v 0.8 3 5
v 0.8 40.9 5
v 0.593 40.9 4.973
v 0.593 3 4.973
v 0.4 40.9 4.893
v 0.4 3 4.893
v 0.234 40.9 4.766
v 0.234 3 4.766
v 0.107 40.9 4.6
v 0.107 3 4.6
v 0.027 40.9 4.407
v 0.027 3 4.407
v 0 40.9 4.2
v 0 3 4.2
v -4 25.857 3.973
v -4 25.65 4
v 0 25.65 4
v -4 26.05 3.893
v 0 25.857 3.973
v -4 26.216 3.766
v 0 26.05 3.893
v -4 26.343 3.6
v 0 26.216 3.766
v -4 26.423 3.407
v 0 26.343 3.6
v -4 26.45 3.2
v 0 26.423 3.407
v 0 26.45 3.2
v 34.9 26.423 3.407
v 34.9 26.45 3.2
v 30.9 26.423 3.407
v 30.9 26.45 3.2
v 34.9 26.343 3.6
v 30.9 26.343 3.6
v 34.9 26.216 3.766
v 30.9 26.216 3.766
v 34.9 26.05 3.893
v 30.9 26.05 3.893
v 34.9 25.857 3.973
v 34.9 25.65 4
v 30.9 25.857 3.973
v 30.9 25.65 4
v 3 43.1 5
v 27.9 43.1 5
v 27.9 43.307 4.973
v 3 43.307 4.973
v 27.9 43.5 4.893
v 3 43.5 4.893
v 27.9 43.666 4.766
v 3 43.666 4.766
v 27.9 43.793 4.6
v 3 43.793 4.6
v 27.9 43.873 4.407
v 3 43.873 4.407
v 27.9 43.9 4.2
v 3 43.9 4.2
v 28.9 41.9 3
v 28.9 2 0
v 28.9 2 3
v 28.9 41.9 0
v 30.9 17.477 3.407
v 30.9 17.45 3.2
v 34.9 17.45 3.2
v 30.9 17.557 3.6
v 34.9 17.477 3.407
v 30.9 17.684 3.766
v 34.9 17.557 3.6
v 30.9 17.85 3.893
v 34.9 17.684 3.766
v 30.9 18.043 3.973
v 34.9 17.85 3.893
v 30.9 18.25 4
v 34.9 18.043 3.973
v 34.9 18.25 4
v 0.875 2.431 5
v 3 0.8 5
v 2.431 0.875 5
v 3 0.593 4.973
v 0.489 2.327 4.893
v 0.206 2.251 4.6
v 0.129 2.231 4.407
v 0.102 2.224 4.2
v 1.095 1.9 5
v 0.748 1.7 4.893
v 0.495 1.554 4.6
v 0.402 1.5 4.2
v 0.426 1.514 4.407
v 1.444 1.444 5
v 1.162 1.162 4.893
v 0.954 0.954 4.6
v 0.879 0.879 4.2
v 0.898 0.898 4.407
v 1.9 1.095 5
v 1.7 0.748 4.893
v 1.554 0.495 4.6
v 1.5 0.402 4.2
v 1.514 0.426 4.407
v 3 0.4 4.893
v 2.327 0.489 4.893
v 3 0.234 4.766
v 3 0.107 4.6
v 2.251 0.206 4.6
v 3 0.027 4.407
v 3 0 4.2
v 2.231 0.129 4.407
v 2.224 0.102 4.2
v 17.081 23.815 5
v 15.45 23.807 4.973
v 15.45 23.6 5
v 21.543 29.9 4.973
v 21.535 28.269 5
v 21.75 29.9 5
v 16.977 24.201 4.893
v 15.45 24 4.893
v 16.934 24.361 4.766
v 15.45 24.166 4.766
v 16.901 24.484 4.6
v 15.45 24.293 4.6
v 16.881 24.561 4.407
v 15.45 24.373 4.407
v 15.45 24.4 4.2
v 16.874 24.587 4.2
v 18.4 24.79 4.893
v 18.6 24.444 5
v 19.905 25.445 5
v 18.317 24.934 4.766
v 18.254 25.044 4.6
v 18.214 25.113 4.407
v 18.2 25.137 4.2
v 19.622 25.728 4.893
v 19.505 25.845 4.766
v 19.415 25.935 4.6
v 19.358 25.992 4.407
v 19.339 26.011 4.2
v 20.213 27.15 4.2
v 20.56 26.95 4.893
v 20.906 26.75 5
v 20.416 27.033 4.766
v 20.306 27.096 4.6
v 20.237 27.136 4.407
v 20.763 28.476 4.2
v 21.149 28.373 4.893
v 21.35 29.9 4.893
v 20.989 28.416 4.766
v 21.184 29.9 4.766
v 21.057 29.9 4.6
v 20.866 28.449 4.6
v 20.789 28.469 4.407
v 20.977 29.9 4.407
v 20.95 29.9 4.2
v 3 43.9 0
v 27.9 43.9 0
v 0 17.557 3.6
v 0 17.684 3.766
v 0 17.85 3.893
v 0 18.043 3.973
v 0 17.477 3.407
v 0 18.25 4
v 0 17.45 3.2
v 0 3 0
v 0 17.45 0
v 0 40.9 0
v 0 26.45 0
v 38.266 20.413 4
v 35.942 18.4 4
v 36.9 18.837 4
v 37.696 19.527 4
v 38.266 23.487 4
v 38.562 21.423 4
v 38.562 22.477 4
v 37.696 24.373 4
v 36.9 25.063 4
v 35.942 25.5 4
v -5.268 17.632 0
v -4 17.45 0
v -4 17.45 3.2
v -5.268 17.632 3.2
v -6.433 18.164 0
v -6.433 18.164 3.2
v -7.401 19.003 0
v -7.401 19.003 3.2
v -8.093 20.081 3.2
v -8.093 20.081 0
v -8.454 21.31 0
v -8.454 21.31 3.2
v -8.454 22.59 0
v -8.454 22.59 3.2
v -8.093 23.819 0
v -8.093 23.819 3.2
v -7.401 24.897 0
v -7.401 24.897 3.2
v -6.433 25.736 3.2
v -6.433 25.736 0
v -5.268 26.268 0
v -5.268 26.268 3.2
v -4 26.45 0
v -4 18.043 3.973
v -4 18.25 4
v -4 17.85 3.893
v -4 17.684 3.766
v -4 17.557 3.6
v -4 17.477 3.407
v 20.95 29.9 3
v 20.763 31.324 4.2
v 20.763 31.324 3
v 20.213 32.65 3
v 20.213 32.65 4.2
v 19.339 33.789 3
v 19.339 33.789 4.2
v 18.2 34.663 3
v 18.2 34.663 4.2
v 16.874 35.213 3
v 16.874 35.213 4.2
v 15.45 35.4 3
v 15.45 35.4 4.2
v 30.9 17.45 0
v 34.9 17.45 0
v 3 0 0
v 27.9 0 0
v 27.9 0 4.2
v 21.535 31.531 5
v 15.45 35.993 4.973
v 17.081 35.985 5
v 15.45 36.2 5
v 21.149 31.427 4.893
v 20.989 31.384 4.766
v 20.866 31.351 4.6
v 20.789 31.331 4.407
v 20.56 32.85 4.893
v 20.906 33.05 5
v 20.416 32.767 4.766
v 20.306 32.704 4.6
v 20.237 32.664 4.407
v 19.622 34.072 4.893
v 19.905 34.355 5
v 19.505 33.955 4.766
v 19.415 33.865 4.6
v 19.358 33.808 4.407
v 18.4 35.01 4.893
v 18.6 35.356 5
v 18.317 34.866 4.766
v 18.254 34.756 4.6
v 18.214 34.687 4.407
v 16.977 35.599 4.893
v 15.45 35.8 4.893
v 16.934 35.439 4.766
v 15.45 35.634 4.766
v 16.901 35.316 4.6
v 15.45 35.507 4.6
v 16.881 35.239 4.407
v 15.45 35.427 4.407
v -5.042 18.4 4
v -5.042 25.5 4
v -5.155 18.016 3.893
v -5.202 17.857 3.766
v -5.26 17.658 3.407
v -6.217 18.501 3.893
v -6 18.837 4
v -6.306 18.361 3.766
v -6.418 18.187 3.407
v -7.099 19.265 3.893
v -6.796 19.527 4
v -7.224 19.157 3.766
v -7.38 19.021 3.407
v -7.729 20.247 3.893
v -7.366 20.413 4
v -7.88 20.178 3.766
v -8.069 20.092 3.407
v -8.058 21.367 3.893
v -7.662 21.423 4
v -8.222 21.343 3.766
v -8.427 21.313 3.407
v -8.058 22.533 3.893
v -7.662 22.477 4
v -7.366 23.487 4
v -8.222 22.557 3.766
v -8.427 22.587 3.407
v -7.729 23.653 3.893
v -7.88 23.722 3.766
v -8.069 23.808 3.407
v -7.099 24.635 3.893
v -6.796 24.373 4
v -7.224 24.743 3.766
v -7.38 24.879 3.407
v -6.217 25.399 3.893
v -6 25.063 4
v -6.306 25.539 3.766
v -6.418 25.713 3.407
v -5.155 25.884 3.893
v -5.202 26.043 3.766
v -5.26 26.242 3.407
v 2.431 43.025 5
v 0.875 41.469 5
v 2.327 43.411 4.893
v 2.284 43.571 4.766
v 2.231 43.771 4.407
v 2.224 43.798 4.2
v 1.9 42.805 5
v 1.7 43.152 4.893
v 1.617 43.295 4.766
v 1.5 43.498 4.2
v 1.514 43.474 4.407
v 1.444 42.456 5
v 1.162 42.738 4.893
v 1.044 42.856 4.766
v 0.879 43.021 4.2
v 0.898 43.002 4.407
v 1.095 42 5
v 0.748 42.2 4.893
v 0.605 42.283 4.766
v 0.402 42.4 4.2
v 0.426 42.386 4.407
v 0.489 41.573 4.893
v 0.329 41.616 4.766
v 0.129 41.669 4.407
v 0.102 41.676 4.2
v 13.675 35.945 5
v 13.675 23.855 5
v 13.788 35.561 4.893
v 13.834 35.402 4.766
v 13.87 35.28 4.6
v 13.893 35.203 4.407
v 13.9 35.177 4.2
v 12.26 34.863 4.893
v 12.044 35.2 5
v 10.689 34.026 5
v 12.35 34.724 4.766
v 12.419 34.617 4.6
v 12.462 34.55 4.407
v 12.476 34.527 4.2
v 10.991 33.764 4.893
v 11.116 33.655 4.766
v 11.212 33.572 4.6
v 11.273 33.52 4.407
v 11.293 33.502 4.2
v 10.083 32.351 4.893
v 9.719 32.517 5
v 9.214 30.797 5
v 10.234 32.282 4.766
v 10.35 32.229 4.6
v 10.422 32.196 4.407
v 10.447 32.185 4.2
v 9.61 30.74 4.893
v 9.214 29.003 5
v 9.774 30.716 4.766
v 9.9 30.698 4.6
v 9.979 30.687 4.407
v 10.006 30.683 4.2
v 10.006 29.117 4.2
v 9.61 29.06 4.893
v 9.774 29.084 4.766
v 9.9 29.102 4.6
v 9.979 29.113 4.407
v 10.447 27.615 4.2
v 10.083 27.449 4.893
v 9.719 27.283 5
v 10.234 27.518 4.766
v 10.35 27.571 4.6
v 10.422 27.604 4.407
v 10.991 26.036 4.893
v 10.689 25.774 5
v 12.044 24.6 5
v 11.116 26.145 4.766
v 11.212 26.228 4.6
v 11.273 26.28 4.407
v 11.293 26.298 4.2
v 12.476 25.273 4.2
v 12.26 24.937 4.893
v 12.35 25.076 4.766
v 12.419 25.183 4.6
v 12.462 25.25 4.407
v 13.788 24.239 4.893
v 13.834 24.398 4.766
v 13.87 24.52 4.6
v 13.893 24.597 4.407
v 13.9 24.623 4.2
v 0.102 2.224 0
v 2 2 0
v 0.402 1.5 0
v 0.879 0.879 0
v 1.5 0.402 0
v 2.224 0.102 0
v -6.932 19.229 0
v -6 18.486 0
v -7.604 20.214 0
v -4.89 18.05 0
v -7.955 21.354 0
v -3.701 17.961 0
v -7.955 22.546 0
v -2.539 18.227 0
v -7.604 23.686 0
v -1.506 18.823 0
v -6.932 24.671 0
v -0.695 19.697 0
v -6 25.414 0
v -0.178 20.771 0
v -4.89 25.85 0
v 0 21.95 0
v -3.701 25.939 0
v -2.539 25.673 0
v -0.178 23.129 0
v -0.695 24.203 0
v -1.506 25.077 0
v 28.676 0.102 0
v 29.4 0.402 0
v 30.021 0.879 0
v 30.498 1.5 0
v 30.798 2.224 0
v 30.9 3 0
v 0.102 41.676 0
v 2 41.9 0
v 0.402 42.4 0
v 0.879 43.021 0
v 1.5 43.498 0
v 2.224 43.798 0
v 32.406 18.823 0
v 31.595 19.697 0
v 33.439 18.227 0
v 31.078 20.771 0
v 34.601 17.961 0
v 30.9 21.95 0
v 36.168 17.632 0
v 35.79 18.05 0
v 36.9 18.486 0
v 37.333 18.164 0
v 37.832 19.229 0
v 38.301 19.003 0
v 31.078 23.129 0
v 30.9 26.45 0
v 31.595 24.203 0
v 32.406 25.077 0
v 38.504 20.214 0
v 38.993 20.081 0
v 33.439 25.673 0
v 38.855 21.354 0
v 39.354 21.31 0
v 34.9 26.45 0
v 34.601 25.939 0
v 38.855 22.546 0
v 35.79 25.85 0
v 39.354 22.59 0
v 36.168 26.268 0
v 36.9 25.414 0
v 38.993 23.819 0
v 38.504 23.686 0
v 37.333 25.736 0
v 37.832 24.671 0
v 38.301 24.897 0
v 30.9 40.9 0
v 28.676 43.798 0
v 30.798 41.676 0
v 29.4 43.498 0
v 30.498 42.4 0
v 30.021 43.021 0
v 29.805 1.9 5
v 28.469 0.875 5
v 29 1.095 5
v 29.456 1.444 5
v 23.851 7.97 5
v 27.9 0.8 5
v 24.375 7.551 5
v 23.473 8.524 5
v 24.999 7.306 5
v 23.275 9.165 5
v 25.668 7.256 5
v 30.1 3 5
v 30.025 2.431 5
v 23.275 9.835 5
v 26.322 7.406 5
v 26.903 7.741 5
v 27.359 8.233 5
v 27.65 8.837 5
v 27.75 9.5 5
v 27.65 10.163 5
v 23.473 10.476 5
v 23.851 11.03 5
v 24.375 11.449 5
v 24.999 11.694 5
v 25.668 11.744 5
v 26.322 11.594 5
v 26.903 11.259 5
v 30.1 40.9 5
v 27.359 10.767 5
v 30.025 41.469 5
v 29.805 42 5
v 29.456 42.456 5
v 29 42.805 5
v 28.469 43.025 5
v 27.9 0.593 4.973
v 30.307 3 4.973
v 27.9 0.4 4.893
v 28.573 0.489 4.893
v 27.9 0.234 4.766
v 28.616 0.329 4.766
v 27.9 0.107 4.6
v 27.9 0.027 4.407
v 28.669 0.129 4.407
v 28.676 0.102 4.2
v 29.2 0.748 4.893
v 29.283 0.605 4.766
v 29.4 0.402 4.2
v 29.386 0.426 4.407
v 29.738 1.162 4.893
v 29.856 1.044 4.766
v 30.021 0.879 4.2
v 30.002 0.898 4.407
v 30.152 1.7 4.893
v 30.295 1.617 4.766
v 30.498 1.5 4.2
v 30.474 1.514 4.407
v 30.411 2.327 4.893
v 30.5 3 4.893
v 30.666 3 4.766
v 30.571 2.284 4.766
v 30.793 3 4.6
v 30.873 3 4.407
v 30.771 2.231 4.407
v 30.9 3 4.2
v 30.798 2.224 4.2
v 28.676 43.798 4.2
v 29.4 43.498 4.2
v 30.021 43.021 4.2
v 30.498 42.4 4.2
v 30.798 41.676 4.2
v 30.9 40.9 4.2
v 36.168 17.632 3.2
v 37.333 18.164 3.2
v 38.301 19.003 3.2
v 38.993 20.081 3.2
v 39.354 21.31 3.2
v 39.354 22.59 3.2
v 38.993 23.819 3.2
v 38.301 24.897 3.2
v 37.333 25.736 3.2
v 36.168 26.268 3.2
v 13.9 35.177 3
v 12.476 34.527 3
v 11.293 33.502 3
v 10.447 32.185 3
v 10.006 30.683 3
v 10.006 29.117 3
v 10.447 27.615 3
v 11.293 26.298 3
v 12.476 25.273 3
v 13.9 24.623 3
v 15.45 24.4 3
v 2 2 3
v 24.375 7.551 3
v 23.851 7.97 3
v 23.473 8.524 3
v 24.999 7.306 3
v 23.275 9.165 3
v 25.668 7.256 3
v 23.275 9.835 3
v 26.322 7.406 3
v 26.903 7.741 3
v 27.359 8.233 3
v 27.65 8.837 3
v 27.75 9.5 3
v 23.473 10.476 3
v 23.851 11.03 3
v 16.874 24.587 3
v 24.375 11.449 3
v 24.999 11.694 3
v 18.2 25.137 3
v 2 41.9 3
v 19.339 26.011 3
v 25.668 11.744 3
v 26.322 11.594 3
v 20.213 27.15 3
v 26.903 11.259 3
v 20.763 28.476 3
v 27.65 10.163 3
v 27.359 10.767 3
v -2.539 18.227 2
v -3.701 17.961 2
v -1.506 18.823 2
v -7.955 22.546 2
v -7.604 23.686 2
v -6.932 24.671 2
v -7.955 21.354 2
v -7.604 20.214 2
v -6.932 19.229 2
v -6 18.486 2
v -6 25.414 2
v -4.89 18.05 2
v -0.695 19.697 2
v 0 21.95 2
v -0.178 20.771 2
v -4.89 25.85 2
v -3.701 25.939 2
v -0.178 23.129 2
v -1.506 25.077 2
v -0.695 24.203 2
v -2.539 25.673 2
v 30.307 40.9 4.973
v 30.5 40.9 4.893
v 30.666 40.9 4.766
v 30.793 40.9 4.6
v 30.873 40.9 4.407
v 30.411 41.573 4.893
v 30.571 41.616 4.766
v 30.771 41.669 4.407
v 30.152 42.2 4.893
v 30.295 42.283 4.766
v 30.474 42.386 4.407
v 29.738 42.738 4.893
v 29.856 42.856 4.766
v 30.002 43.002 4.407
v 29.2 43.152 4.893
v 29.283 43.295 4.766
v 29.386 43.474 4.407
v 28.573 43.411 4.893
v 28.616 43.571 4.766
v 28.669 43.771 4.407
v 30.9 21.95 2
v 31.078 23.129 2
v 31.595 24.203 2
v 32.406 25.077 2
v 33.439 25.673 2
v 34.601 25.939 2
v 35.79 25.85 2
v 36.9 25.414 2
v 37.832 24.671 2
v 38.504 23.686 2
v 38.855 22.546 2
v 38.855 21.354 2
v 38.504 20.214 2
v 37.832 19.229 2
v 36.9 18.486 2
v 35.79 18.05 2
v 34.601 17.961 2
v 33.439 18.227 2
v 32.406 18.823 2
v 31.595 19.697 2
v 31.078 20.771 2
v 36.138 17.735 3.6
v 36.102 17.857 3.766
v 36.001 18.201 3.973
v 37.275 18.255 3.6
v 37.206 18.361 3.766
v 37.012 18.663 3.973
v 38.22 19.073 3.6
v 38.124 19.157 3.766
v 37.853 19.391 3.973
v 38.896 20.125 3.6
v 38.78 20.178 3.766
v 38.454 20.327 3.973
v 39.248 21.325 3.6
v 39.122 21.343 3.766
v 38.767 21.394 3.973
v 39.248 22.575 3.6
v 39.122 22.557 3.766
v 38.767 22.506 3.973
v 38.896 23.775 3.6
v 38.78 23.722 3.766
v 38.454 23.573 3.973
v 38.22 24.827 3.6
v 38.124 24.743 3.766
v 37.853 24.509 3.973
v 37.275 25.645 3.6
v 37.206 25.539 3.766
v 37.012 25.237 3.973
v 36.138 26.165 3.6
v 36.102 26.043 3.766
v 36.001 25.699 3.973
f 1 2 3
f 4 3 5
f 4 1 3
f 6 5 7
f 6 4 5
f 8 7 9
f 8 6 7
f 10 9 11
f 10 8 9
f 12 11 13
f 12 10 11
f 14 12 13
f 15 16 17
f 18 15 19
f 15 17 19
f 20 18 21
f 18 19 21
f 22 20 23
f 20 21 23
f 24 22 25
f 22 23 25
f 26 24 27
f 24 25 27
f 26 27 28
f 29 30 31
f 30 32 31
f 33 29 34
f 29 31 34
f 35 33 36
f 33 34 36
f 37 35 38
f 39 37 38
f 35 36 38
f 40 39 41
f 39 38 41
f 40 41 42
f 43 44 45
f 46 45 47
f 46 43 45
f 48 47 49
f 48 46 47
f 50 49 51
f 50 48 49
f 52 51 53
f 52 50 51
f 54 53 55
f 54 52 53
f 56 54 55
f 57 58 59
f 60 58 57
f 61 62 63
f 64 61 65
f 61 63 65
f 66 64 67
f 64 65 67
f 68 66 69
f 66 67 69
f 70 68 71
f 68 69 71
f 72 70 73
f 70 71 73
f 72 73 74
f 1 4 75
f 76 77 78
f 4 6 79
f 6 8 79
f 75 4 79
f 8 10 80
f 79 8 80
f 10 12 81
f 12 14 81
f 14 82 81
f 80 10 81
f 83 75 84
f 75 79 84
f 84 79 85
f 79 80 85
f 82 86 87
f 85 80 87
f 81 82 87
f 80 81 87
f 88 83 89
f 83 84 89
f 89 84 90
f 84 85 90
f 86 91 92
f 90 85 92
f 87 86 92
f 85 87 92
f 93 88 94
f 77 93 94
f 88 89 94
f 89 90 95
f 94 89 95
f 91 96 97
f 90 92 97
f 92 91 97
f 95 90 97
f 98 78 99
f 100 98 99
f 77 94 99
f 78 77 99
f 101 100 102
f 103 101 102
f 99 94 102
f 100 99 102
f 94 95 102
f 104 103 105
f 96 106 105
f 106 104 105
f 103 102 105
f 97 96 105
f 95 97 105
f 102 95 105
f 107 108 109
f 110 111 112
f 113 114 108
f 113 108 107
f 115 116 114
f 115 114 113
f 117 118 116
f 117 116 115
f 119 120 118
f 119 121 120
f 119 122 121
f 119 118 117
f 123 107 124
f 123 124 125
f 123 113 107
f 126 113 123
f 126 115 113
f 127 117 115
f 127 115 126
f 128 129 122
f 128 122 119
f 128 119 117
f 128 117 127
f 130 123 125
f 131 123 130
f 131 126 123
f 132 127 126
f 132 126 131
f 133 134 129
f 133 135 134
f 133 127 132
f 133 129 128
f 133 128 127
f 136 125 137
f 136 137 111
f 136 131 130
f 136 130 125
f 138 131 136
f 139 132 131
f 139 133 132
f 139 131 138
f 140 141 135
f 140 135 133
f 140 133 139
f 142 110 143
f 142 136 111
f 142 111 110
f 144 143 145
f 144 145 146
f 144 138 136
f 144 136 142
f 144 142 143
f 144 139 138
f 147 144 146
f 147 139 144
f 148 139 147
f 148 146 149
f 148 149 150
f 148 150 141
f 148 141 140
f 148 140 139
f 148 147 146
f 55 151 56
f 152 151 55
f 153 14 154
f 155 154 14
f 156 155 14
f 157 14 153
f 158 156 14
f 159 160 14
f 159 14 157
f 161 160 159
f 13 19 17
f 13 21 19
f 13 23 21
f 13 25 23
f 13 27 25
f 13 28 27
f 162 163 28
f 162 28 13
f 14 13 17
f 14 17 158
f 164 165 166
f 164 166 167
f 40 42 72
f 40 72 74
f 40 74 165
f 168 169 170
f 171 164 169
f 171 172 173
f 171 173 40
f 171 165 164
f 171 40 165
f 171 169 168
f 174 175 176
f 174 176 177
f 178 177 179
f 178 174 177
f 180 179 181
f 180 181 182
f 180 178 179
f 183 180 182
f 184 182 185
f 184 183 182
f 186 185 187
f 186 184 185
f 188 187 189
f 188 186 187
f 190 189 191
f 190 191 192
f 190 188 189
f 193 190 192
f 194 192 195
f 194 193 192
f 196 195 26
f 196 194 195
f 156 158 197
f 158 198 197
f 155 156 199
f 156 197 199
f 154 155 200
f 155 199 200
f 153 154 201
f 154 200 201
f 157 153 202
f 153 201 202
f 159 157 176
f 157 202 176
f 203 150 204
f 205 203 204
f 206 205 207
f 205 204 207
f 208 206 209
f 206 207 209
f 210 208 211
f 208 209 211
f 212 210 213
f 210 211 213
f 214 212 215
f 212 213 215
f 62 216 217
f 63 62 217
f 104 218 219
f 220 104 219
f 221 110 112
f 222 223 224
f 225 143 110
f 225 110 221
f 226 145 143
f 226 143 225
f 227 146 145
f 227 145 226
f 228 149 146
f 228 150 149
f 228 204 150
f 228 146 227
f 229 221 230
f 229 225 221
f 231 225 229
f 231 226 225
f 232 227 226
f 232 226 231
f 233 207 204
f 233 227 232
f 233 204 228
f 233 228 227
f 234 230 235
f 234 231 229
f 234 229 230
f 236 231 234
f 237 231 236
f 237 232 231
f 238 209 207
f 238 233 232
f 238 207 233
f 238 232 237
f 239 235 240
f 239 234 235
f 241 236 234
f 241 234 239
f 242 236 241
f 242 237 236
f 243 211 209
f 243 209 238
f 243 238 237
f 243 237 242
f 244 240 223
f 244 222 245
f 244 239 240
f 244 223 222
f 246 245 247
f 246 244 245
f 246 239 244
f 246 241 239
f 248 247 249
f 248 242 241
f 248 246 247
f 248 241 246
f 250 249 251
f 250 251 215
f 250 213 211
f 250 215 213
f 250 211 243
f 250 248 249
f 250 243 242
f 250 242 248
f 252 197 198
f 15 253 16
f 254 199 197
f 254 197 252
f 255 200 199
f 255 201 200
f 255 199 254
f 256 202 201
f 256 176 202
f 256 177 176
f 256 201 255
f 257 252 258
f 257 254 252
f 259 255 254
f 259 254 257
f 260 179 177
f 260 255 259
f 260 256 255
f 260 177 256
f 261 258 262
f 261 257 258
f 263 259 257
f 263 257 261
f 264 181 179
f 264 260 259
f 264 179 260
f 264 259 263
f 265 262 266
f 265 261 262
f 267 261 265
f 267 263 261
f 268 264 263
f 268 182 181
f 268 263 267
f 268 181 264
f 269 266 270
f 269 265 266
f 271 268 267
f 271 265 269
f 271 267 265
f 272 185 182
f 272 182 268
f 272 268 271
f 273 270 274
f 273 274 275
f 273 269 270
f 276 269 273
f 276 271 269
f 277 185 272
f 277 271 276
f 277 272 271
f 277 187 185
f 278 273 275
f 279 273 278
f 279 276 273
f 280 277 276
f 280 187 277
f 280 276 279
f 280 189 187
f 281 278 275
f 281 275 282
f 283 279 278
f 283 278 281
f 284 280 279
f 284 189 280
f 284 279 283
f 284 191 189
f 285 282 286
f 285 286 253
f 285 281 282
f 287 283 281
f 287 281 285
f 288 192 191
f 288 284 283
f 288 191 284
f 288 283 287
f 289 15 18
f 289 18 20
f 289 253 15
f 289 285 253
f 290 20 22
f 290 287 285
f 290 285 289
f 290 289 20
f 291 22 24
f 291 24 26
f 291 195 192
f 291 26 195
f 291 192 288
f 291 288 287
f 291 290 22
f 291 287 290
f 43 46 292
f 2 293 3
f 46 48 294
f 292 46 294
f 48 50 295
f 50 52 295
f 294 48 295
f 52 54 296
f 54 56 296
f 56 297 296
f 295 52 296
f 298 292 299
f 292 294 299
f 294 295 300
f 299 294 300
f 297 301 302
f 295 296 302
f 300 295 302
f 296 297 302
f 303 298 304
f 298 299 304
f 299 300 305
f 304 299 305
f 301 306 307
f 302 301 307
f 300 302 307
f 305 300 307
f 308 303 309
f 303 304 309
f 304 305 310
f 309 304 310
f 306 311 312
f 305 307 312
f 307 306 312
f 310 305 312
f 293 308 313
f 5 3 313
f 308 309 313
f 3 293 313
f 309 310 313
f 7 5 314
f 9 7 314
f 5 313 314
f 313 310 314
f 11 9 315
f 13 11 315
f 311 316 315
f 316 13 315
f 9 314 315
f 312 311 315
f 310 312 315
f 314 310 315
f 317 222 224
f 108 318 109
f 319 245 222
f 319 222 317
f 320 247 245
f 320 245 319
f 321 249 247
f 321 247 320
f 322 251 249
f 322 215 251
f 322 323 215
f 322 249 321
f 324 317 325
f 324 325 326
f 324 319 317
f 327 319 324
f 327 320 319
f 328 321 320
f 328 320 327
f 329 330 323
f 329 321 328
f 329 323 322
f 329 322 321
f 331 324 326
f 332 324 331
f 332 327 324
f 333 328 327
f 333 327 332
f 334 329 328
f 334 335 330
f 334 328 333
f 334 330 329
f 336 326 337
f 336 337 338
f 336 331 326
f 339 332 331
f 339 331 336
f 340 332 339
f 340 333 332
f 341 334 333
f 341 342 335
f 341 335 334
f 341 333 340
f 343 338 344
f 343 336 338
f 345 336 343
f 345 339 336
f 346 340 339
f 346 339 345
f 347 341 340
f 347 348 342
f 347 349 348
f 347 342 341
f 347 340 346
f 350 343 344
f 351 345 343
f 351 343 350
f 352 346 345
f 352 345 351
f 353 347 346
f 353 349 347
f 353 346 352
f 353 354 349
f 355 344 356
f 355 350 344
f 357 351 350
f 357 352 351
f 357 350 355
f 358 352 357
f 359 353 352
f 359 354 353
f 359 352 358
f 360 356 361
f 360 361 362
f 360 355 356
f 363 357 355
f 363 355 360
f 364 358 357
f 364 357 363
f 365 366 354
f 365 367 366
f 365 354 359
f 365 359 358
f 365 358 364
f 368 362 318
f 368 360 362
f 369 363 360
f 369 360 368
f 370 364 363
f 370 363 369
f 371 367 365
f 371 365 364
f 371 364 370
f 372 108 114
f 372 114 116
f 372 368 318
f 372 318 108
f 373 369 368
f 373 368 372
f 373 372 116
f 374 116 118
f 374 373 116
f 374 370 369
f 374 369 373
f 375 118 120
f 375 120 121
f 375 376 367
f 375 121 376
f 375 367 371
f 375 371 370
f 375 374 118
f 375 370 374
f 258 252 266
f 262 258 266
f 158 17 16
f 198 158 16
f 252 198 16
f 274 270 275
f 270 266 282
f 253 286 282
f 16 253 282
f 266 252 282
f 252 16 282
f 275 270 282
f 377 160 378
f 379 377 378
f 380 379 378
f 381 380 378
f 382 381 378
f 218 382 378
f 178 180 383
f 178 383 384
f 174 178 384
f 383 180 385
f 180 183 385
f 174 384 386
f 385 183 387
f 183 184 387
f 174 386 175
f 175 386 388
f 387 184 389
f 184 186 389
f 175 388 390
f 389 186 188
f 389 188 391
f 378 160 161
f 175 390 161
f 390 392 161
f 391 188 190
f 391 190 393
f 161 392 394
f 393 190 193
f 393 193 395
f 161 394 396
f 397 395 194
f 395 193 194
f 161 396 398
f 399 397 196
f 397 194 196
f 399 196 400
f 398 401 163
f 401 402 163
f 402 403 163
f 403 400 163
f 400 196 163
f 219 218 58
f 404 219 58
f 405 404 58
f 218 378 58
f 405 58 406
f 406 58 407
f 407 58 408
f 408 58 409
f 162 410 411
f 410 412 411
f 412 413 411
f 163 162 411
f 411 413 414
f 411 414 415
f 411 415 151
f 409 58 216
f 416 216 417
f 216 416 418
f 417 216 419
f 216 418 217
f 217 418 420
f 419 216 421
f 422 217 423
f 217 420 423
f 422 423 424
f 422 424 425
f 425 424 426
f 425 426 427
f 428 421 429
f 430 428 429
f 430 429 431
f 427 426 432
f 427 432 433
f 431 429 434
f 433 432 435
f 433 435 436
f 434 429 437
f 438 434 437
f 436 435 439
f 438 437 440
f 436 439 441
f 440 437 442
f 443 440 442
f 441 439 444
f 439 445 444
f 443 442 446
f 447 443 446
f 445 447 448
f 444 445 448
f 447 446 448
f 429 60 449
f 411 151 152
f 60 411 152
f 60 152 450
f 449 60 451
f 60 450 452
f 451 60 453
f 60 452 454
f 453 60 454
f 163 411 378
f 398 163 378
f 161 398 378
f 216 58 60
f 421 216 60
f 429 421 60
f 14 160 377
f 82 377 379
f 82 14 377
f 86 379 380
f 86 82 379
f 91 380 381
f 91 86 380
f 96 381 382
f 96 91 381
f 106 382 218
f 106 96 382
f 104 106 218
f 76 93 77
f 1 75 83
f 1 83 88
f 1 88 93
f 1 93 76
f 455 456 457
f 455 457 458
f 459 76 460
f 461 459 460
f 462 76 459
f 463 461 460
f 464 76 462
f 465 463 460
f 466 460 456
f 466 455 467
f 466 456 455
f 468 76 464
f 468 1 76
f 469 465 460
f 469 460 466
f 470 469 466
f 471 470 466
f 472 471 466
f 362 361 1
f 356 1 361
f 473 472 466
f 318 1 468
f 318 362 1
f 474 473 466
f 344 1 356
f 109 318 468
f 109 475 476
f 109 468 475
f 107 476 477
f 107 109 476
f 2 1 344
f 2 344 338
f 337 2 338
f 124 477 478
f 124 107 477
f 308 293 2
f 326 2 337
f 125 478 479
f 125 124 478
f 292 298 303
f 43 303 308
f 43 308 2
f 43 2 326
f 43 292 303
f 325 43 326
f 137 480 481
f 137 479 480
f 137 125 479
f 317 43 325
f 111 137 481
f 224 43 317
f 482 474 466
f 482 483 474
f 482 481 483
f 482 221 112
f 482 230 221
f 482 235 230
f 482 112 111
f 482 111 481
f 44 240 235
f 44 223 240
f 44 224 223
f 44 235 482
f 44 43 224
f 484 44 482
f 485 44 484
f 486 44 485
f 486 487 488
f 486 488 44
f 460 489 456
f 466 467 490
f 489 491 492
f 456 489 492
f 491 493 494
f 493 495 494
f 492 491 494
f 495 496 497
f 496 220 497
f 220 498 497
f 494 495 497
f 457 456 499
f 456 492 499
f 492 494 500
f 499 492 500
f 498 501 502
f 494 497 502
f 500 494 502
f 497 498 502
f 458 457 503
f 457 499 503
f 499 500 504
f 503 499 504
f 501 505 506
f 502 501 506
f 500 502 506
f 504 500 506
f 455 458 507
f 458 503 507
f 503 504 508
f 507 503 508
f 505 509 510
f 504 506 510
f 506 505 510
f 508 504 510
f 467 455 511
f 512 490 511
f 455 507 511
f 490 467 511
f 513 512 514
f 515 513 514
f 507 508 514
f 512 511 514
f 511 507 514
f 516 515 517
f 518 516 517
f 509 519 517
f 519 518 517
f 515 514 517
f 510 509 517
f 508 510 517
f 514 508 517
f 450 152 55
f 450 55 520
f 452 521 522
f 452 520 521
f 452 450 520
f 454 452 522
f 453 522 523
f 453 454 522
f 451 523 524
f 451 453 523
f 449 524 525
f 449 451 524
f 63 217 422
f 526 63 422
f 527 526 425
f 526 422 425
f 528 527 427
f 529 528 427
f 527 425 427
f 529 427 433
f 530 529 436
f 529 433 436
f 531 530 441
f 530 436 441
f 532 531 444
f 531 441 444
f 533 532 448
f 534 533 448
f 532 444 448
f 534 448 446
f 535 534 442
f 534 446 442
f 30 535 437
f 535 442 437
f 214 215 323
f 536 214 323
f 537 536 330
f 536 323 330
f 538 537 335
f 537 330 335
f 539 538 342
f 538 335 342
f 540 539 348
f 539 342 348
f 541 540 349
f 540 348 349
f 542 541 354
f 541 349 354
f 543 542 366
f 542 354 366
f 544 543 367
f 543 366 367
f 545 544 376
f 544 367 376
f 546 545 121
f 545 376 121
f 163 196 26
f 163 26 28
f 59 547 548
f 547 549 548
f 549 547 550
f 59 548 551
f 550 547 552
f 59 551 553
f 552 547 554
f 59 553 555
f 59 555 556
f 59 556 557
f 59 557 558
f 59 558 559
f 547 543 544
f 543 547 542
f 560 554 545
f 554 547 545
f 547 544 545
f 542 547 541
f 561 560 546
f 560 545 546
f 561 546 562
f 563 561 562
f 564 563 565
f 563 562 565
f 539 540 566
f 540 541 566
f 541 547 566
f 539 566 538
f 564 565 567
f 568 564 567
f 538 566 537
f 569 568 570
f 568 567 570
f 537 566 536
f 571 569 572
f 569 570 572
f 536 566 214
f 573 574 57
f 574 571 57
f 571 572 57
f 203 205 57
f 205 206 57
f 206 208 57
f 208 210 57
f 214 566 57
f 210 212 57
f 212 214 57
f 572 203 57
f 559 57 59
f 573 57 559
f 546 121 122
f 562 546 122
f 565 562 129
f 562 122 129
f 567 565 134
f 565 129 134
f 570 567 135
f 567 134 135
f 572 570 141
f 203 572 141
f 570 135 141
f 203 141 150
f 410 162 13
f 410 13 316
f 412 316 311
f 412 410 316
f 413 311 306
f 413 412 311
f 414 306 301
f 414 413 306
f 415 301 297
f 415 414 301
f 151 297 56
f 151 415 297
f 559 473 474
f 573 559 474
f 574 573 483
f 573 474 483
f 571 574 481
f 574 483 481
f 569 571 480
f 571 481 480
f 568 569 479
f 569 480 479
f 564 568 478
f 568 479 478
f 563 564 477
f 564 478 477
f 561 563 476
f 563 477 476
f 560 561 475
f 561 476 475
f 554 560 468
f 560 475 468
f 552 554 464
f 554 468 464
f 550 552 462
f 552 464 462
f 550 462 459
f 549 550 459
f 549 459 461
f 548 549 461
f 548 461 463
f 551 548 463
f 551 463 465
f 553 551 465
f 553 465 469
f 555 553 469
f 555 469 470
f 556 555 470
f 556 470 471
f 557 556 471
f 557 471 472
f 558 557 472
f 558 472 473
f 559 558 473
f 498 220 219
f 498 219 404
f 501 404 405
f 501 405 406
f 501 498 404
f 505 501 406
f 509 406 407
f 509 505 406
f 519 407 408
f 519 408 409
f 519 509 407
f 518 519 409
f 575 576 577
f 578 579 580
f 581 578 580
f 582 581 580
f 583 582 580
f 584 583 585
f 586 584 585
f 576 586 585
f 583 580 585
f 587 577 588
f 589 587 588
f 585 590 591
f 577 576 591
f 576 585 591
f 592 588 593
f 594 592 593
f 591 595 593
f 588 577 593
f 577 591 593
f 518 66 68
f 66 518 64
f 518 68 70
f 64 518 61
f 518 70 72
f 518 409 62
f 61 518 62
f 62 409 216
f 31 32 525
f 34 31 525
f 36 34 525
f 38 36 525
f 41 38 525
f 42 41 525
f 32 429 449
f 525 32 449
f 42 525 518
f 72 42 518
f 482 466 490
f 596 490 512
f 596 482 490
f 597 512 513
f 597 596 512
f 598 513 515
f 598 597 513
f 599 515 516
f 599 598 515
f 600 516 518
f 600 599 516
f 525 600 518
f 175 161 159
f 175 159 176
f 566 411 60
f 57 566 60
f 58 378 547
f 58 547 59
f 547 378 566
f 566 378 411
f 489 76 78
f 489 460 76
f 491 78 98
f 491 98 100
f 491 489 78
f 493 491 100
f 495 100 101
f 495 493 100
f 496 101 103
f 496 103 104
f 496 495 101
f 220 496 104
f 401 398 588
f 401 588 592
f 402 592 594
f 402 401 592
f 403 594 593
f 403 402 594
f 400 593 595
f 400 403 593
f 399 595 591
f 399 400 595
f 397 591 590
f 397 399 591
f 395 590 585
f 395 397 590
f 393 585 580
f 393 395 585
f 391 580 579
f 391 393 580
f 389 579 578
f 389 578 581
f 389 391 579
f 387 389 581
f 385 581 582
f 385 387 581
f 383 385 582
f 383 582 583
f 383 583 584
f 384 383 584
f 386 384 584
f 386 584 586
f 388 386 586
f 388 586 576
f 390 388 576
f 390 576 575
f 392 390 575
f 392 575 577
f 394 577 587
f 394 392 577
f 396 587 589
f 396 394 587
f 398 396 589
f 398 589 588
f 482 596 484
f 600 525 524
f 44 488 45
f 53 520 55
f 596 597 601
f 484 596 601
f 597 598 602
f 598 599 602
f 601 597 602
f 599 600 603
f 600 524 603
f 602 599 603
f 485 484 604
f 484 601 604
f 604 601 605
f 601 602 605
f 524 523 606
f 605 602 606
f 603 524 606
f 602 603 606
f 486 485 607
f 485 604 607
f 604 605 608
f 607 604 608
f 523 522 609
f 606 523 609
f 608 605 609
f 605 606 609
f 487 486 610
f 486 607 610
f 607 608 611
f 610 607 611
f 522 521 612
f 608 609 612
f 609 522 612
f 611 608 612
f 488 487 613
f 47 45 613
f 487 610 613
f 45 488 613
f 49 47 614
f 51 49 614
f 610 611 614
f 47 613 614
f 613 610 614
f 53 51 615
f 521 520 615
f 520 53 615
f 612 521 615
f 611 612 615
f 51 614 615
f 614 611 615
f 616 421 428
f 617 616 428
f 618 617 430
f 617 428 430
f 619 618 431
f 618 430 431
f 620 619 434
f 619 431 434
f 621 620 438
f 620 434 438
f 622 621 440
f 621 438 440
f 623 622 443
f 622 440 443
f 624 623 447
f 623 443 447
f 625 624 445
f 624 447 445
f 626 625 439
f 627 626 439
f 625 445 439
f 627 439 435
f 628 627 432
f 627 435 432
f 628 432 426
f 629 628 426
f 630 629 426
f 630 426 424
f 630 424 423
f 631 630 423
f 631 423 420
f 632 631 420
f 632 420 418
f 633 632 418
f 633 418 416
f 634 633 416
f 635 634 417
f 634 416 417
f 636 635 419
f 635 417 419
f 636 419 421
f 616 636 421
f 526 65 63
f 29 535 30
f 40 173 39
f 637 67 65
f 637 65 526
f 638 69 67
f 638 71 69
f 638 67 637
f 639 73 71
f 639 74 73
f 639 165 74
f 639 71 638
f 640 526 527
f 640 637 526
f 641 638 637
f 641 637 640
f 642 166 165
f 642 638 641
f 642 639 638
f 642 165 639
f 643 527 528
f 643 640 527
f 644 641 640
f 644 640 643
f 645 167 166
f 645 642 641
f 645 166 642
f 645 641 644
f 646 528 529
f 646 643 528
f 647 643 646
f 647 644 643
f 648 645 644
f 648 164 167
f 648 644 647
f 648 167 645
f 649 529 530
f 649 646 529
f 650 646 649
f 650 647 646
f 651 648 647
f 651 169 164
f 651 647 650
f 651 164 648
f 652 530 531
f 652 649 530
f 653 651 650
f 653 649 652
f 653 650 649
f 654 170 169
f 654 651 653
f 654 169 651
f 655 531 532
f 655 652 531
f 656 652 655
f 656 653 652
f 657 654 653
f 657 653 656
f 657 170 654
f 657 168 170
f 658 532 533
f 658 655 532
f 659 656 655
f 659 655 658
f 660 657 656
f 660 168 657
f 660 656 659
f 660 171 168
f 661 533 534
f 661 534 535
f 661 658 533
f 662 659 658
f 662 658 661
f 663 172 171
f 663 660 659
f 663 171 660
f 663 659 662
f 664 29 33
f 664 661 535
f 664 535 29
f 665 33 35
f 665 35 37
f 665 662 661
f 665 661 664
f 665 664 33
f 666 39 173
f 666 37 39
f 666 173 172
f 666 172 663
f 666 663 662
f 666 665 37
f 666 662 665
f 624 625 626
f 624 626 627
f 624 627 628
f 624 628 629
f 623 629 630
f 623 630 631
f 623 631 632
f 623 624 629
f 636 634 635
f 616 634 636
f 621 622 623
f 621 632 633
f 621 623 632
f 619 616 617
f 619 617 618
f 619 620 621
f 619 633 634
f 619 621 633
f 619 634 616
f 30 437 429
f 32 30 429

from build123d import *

# Parameters (mm, degrees)
SKETCH1_W           = 30.9
SKETCH1_H           = 43.9
SKETCH1_W_2         = 26.9
SKETCH1_H_2         = 39.9
BOSS_EXTRUDE1_DEPTH = 5
SKETCH2_W           = 30.9
SKETCH2_H           = 43.9
BOSS_EXTRUDE2_DEPTH = 2
BOSS_EXTRUDE3_DEPTH = 4
SKETCH4_R           = 4
CUT_EXTRUDE1_DEPTH  = 2
CUT_EXTRUDE2_DEPTH  = 60.199408781
FILLET1_R           = 3
FILLET2_R           = 0.8
SKETCH6_R           = 2.25
CUT_EXTRUDE3_DEPTH  = 60.199408781


with BuildPart() as part:
    # Sketch1 → Boss-Extrude1 (new body)
    with BuildSketch(Plane.XY):
        with Locations((15.45, 21.95)):
            Rectangle(SKETCH1_W, SKETCH1_H)
        with Locations((15.45, 21.95)):
            Rectangle(SKETCH1_W_2, SKETCH1_H_2, mode=Mode.SUBTRACT)
    extrude(amount=BOSS_EXTRUDE1_DEPTH)

    # Sketch2 → Boss-Extrude2 (add)
    with BuildSketch(Plane.XY.offset(5)):
        with Locations((15.45, 21.95)):
            Rectangle(SKETCH2_W, SKETCH2_H)
    extrude(amount=-BOSS_EXTRUDE2_DEPTH)

    # Sketch3 → Boss-Extrude3 (add)
    with BuildSketch(Plane(origin=(0, 0, 0), x_dir=(-1, 0, 0), z_dir=(0, 0, -1))):
        with BuildLine():
            Line((-34.9, 26.45), (-30.9, 26.45))
            Line((-30.9, 26.45), (-30.9, 17.45))
            Line((-30.9, 17.45), (-34.9, 17.45))
            ThreePointArc((-34.9, 17.45), (-39.4, 21.95), (-34.9, 26.45))
        make_face()
    boss_extrude3 = extrude(amount=-BOSS_EXTRUDE3_DEPTH)

    # Sketch4 → Cut-Extrude1 (cut)
    with BuildSketch(Plane(origin=(0, 0, 0), x_dir=(-1, 0, 0), z_dir=(0, 0, -1))):
        with Locations((-34.9, 21.95)):
            Circle(SKETCH4_R)
    cut_extrude1 = extrude(amount=-CUT_EXTRUDE1_DEPTH, mode=Mode.SUBTRACT)

    # Mirror1: Boss-Extrude3, Cut-Extrude1 across plane
    add(boss_extrude3.mirror(Plane(origin=(15.45, 0, 0), x_dir=(0, 0, 1), z_dir=(1, 0, 0))))
    add(cut_extrude1.mirror(Plane(origin=(15.45, 0, 0), x_dir=(0, 0, 1), z_dir=(1, 0, 0))), mode=Mode.SUBTRACT)

    # Sketch5 → Cut-Extrude2 (cut, through all)
    with BuildSketch(Plane.XY.offset(5)):
        with BuildLine():
            ThreePointArc((20.95, 29.9), (19.339087297, 33.789087297), (15.45, 35.4))
            Line((15.45, 35.4), (15.45, 24.4))
            ThreePointArc((15.45, 24.4), (19.339087297, 26.010912703), (20.95, 29.9))
        make_face()
        with BuildLine():
            Line((15.45, 24.4), (15.45, 35.4))
            ThreePointArc((15.45, 35.4), (9.95, 29.9), (15.45, 24.4))
        make_face()
    extrude(amount=-CUT_EXTRUDE2_DEPTH, mode=Mode.SUBTRACT)

    # Fillet1
    fillet1_edges = [part.edges().sort_by_distance(p)[0] for p in [
        (0, 0, 2.5),
        (0, 43.9, 2.5),
        (30.9, 43.9, 2.5),
        (30.9, 0, 2.5),
    ]]
    fillet(fillet1_edges, radius=FILLET1_R)

    # Fillet2
    fillet2_edges = [part.edges().sort_by_distance(p)[0] for p in [
        (15.45, 0, 5),
        (15.45, 43.9, 5),
        (0, 21.95, 5),
        (0.878679656, 43.021320344, 5),
        (30.021320344, 43.021320344, 5),
        (0.878679656, 0.878679656, 5),
        (30.021320344, 0.878679656, 5),
        (39.4, 21.95, 4),
        (32.9, 26.45, 4),
        (32.9, 17.45, 4),
        (-8.5, 21.95, 4),
        (-2, 17.45, 4),
        (-2, 26.45, 4),
        (15.45, 35.4, 5),
        (30.9, 21.95, 5),
    ]]
    fillet(fillet2_edges, radius=FILLET2_R)

    # Sketch6 → Cut-Extrude3 (cut, through all)
    with BuildSketch(Plane.XY.offset(5)):
        with Locations((25.5, 9.5)):
            Circle(SKETCH6_R)
    extrude(amount=-CUT_EXTRUDE3_DEPTH, mode=Mode.SUBTRACT)


solid = part.part
